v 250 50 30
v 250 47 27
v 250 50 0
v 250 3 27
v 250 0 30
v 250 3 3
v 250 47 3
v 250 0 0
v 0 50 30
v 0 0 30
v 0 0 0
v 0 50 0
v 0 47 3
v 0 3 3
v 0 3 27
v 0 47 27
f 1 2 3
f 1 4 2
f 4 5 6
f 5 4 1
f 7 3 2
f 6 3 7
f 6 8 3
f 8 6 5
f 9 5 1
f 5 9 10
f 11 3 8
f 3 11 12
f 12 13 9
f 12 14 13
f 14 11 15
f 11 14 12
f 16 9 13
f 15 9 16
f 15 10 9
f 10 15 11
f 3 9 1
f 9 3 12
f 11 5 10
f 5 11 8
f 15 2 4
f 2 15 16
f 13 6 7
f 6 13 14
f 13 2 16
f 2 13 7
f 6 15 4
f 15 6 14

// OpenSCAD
$fn = 32;

// ----------------------------------------------------------------------
// Box beam: 200-250 mm hollow beam
// ----------------------------------------------------------------------

// --- parameters (mm) ---
beam_l = 250;             // beam length, X
beam_w = 50;              // beam width, Y
beam_h = 30;              // beam height, Z
wall = 3;                 // wall thickness

difference() {
  cube([beam_l, beam_w, beam_h]);
  translate([-1, wall, wall])
    cube([beam_l + 2, beam_w - 2 * wall, beam_h - 2 * wall]);
}
